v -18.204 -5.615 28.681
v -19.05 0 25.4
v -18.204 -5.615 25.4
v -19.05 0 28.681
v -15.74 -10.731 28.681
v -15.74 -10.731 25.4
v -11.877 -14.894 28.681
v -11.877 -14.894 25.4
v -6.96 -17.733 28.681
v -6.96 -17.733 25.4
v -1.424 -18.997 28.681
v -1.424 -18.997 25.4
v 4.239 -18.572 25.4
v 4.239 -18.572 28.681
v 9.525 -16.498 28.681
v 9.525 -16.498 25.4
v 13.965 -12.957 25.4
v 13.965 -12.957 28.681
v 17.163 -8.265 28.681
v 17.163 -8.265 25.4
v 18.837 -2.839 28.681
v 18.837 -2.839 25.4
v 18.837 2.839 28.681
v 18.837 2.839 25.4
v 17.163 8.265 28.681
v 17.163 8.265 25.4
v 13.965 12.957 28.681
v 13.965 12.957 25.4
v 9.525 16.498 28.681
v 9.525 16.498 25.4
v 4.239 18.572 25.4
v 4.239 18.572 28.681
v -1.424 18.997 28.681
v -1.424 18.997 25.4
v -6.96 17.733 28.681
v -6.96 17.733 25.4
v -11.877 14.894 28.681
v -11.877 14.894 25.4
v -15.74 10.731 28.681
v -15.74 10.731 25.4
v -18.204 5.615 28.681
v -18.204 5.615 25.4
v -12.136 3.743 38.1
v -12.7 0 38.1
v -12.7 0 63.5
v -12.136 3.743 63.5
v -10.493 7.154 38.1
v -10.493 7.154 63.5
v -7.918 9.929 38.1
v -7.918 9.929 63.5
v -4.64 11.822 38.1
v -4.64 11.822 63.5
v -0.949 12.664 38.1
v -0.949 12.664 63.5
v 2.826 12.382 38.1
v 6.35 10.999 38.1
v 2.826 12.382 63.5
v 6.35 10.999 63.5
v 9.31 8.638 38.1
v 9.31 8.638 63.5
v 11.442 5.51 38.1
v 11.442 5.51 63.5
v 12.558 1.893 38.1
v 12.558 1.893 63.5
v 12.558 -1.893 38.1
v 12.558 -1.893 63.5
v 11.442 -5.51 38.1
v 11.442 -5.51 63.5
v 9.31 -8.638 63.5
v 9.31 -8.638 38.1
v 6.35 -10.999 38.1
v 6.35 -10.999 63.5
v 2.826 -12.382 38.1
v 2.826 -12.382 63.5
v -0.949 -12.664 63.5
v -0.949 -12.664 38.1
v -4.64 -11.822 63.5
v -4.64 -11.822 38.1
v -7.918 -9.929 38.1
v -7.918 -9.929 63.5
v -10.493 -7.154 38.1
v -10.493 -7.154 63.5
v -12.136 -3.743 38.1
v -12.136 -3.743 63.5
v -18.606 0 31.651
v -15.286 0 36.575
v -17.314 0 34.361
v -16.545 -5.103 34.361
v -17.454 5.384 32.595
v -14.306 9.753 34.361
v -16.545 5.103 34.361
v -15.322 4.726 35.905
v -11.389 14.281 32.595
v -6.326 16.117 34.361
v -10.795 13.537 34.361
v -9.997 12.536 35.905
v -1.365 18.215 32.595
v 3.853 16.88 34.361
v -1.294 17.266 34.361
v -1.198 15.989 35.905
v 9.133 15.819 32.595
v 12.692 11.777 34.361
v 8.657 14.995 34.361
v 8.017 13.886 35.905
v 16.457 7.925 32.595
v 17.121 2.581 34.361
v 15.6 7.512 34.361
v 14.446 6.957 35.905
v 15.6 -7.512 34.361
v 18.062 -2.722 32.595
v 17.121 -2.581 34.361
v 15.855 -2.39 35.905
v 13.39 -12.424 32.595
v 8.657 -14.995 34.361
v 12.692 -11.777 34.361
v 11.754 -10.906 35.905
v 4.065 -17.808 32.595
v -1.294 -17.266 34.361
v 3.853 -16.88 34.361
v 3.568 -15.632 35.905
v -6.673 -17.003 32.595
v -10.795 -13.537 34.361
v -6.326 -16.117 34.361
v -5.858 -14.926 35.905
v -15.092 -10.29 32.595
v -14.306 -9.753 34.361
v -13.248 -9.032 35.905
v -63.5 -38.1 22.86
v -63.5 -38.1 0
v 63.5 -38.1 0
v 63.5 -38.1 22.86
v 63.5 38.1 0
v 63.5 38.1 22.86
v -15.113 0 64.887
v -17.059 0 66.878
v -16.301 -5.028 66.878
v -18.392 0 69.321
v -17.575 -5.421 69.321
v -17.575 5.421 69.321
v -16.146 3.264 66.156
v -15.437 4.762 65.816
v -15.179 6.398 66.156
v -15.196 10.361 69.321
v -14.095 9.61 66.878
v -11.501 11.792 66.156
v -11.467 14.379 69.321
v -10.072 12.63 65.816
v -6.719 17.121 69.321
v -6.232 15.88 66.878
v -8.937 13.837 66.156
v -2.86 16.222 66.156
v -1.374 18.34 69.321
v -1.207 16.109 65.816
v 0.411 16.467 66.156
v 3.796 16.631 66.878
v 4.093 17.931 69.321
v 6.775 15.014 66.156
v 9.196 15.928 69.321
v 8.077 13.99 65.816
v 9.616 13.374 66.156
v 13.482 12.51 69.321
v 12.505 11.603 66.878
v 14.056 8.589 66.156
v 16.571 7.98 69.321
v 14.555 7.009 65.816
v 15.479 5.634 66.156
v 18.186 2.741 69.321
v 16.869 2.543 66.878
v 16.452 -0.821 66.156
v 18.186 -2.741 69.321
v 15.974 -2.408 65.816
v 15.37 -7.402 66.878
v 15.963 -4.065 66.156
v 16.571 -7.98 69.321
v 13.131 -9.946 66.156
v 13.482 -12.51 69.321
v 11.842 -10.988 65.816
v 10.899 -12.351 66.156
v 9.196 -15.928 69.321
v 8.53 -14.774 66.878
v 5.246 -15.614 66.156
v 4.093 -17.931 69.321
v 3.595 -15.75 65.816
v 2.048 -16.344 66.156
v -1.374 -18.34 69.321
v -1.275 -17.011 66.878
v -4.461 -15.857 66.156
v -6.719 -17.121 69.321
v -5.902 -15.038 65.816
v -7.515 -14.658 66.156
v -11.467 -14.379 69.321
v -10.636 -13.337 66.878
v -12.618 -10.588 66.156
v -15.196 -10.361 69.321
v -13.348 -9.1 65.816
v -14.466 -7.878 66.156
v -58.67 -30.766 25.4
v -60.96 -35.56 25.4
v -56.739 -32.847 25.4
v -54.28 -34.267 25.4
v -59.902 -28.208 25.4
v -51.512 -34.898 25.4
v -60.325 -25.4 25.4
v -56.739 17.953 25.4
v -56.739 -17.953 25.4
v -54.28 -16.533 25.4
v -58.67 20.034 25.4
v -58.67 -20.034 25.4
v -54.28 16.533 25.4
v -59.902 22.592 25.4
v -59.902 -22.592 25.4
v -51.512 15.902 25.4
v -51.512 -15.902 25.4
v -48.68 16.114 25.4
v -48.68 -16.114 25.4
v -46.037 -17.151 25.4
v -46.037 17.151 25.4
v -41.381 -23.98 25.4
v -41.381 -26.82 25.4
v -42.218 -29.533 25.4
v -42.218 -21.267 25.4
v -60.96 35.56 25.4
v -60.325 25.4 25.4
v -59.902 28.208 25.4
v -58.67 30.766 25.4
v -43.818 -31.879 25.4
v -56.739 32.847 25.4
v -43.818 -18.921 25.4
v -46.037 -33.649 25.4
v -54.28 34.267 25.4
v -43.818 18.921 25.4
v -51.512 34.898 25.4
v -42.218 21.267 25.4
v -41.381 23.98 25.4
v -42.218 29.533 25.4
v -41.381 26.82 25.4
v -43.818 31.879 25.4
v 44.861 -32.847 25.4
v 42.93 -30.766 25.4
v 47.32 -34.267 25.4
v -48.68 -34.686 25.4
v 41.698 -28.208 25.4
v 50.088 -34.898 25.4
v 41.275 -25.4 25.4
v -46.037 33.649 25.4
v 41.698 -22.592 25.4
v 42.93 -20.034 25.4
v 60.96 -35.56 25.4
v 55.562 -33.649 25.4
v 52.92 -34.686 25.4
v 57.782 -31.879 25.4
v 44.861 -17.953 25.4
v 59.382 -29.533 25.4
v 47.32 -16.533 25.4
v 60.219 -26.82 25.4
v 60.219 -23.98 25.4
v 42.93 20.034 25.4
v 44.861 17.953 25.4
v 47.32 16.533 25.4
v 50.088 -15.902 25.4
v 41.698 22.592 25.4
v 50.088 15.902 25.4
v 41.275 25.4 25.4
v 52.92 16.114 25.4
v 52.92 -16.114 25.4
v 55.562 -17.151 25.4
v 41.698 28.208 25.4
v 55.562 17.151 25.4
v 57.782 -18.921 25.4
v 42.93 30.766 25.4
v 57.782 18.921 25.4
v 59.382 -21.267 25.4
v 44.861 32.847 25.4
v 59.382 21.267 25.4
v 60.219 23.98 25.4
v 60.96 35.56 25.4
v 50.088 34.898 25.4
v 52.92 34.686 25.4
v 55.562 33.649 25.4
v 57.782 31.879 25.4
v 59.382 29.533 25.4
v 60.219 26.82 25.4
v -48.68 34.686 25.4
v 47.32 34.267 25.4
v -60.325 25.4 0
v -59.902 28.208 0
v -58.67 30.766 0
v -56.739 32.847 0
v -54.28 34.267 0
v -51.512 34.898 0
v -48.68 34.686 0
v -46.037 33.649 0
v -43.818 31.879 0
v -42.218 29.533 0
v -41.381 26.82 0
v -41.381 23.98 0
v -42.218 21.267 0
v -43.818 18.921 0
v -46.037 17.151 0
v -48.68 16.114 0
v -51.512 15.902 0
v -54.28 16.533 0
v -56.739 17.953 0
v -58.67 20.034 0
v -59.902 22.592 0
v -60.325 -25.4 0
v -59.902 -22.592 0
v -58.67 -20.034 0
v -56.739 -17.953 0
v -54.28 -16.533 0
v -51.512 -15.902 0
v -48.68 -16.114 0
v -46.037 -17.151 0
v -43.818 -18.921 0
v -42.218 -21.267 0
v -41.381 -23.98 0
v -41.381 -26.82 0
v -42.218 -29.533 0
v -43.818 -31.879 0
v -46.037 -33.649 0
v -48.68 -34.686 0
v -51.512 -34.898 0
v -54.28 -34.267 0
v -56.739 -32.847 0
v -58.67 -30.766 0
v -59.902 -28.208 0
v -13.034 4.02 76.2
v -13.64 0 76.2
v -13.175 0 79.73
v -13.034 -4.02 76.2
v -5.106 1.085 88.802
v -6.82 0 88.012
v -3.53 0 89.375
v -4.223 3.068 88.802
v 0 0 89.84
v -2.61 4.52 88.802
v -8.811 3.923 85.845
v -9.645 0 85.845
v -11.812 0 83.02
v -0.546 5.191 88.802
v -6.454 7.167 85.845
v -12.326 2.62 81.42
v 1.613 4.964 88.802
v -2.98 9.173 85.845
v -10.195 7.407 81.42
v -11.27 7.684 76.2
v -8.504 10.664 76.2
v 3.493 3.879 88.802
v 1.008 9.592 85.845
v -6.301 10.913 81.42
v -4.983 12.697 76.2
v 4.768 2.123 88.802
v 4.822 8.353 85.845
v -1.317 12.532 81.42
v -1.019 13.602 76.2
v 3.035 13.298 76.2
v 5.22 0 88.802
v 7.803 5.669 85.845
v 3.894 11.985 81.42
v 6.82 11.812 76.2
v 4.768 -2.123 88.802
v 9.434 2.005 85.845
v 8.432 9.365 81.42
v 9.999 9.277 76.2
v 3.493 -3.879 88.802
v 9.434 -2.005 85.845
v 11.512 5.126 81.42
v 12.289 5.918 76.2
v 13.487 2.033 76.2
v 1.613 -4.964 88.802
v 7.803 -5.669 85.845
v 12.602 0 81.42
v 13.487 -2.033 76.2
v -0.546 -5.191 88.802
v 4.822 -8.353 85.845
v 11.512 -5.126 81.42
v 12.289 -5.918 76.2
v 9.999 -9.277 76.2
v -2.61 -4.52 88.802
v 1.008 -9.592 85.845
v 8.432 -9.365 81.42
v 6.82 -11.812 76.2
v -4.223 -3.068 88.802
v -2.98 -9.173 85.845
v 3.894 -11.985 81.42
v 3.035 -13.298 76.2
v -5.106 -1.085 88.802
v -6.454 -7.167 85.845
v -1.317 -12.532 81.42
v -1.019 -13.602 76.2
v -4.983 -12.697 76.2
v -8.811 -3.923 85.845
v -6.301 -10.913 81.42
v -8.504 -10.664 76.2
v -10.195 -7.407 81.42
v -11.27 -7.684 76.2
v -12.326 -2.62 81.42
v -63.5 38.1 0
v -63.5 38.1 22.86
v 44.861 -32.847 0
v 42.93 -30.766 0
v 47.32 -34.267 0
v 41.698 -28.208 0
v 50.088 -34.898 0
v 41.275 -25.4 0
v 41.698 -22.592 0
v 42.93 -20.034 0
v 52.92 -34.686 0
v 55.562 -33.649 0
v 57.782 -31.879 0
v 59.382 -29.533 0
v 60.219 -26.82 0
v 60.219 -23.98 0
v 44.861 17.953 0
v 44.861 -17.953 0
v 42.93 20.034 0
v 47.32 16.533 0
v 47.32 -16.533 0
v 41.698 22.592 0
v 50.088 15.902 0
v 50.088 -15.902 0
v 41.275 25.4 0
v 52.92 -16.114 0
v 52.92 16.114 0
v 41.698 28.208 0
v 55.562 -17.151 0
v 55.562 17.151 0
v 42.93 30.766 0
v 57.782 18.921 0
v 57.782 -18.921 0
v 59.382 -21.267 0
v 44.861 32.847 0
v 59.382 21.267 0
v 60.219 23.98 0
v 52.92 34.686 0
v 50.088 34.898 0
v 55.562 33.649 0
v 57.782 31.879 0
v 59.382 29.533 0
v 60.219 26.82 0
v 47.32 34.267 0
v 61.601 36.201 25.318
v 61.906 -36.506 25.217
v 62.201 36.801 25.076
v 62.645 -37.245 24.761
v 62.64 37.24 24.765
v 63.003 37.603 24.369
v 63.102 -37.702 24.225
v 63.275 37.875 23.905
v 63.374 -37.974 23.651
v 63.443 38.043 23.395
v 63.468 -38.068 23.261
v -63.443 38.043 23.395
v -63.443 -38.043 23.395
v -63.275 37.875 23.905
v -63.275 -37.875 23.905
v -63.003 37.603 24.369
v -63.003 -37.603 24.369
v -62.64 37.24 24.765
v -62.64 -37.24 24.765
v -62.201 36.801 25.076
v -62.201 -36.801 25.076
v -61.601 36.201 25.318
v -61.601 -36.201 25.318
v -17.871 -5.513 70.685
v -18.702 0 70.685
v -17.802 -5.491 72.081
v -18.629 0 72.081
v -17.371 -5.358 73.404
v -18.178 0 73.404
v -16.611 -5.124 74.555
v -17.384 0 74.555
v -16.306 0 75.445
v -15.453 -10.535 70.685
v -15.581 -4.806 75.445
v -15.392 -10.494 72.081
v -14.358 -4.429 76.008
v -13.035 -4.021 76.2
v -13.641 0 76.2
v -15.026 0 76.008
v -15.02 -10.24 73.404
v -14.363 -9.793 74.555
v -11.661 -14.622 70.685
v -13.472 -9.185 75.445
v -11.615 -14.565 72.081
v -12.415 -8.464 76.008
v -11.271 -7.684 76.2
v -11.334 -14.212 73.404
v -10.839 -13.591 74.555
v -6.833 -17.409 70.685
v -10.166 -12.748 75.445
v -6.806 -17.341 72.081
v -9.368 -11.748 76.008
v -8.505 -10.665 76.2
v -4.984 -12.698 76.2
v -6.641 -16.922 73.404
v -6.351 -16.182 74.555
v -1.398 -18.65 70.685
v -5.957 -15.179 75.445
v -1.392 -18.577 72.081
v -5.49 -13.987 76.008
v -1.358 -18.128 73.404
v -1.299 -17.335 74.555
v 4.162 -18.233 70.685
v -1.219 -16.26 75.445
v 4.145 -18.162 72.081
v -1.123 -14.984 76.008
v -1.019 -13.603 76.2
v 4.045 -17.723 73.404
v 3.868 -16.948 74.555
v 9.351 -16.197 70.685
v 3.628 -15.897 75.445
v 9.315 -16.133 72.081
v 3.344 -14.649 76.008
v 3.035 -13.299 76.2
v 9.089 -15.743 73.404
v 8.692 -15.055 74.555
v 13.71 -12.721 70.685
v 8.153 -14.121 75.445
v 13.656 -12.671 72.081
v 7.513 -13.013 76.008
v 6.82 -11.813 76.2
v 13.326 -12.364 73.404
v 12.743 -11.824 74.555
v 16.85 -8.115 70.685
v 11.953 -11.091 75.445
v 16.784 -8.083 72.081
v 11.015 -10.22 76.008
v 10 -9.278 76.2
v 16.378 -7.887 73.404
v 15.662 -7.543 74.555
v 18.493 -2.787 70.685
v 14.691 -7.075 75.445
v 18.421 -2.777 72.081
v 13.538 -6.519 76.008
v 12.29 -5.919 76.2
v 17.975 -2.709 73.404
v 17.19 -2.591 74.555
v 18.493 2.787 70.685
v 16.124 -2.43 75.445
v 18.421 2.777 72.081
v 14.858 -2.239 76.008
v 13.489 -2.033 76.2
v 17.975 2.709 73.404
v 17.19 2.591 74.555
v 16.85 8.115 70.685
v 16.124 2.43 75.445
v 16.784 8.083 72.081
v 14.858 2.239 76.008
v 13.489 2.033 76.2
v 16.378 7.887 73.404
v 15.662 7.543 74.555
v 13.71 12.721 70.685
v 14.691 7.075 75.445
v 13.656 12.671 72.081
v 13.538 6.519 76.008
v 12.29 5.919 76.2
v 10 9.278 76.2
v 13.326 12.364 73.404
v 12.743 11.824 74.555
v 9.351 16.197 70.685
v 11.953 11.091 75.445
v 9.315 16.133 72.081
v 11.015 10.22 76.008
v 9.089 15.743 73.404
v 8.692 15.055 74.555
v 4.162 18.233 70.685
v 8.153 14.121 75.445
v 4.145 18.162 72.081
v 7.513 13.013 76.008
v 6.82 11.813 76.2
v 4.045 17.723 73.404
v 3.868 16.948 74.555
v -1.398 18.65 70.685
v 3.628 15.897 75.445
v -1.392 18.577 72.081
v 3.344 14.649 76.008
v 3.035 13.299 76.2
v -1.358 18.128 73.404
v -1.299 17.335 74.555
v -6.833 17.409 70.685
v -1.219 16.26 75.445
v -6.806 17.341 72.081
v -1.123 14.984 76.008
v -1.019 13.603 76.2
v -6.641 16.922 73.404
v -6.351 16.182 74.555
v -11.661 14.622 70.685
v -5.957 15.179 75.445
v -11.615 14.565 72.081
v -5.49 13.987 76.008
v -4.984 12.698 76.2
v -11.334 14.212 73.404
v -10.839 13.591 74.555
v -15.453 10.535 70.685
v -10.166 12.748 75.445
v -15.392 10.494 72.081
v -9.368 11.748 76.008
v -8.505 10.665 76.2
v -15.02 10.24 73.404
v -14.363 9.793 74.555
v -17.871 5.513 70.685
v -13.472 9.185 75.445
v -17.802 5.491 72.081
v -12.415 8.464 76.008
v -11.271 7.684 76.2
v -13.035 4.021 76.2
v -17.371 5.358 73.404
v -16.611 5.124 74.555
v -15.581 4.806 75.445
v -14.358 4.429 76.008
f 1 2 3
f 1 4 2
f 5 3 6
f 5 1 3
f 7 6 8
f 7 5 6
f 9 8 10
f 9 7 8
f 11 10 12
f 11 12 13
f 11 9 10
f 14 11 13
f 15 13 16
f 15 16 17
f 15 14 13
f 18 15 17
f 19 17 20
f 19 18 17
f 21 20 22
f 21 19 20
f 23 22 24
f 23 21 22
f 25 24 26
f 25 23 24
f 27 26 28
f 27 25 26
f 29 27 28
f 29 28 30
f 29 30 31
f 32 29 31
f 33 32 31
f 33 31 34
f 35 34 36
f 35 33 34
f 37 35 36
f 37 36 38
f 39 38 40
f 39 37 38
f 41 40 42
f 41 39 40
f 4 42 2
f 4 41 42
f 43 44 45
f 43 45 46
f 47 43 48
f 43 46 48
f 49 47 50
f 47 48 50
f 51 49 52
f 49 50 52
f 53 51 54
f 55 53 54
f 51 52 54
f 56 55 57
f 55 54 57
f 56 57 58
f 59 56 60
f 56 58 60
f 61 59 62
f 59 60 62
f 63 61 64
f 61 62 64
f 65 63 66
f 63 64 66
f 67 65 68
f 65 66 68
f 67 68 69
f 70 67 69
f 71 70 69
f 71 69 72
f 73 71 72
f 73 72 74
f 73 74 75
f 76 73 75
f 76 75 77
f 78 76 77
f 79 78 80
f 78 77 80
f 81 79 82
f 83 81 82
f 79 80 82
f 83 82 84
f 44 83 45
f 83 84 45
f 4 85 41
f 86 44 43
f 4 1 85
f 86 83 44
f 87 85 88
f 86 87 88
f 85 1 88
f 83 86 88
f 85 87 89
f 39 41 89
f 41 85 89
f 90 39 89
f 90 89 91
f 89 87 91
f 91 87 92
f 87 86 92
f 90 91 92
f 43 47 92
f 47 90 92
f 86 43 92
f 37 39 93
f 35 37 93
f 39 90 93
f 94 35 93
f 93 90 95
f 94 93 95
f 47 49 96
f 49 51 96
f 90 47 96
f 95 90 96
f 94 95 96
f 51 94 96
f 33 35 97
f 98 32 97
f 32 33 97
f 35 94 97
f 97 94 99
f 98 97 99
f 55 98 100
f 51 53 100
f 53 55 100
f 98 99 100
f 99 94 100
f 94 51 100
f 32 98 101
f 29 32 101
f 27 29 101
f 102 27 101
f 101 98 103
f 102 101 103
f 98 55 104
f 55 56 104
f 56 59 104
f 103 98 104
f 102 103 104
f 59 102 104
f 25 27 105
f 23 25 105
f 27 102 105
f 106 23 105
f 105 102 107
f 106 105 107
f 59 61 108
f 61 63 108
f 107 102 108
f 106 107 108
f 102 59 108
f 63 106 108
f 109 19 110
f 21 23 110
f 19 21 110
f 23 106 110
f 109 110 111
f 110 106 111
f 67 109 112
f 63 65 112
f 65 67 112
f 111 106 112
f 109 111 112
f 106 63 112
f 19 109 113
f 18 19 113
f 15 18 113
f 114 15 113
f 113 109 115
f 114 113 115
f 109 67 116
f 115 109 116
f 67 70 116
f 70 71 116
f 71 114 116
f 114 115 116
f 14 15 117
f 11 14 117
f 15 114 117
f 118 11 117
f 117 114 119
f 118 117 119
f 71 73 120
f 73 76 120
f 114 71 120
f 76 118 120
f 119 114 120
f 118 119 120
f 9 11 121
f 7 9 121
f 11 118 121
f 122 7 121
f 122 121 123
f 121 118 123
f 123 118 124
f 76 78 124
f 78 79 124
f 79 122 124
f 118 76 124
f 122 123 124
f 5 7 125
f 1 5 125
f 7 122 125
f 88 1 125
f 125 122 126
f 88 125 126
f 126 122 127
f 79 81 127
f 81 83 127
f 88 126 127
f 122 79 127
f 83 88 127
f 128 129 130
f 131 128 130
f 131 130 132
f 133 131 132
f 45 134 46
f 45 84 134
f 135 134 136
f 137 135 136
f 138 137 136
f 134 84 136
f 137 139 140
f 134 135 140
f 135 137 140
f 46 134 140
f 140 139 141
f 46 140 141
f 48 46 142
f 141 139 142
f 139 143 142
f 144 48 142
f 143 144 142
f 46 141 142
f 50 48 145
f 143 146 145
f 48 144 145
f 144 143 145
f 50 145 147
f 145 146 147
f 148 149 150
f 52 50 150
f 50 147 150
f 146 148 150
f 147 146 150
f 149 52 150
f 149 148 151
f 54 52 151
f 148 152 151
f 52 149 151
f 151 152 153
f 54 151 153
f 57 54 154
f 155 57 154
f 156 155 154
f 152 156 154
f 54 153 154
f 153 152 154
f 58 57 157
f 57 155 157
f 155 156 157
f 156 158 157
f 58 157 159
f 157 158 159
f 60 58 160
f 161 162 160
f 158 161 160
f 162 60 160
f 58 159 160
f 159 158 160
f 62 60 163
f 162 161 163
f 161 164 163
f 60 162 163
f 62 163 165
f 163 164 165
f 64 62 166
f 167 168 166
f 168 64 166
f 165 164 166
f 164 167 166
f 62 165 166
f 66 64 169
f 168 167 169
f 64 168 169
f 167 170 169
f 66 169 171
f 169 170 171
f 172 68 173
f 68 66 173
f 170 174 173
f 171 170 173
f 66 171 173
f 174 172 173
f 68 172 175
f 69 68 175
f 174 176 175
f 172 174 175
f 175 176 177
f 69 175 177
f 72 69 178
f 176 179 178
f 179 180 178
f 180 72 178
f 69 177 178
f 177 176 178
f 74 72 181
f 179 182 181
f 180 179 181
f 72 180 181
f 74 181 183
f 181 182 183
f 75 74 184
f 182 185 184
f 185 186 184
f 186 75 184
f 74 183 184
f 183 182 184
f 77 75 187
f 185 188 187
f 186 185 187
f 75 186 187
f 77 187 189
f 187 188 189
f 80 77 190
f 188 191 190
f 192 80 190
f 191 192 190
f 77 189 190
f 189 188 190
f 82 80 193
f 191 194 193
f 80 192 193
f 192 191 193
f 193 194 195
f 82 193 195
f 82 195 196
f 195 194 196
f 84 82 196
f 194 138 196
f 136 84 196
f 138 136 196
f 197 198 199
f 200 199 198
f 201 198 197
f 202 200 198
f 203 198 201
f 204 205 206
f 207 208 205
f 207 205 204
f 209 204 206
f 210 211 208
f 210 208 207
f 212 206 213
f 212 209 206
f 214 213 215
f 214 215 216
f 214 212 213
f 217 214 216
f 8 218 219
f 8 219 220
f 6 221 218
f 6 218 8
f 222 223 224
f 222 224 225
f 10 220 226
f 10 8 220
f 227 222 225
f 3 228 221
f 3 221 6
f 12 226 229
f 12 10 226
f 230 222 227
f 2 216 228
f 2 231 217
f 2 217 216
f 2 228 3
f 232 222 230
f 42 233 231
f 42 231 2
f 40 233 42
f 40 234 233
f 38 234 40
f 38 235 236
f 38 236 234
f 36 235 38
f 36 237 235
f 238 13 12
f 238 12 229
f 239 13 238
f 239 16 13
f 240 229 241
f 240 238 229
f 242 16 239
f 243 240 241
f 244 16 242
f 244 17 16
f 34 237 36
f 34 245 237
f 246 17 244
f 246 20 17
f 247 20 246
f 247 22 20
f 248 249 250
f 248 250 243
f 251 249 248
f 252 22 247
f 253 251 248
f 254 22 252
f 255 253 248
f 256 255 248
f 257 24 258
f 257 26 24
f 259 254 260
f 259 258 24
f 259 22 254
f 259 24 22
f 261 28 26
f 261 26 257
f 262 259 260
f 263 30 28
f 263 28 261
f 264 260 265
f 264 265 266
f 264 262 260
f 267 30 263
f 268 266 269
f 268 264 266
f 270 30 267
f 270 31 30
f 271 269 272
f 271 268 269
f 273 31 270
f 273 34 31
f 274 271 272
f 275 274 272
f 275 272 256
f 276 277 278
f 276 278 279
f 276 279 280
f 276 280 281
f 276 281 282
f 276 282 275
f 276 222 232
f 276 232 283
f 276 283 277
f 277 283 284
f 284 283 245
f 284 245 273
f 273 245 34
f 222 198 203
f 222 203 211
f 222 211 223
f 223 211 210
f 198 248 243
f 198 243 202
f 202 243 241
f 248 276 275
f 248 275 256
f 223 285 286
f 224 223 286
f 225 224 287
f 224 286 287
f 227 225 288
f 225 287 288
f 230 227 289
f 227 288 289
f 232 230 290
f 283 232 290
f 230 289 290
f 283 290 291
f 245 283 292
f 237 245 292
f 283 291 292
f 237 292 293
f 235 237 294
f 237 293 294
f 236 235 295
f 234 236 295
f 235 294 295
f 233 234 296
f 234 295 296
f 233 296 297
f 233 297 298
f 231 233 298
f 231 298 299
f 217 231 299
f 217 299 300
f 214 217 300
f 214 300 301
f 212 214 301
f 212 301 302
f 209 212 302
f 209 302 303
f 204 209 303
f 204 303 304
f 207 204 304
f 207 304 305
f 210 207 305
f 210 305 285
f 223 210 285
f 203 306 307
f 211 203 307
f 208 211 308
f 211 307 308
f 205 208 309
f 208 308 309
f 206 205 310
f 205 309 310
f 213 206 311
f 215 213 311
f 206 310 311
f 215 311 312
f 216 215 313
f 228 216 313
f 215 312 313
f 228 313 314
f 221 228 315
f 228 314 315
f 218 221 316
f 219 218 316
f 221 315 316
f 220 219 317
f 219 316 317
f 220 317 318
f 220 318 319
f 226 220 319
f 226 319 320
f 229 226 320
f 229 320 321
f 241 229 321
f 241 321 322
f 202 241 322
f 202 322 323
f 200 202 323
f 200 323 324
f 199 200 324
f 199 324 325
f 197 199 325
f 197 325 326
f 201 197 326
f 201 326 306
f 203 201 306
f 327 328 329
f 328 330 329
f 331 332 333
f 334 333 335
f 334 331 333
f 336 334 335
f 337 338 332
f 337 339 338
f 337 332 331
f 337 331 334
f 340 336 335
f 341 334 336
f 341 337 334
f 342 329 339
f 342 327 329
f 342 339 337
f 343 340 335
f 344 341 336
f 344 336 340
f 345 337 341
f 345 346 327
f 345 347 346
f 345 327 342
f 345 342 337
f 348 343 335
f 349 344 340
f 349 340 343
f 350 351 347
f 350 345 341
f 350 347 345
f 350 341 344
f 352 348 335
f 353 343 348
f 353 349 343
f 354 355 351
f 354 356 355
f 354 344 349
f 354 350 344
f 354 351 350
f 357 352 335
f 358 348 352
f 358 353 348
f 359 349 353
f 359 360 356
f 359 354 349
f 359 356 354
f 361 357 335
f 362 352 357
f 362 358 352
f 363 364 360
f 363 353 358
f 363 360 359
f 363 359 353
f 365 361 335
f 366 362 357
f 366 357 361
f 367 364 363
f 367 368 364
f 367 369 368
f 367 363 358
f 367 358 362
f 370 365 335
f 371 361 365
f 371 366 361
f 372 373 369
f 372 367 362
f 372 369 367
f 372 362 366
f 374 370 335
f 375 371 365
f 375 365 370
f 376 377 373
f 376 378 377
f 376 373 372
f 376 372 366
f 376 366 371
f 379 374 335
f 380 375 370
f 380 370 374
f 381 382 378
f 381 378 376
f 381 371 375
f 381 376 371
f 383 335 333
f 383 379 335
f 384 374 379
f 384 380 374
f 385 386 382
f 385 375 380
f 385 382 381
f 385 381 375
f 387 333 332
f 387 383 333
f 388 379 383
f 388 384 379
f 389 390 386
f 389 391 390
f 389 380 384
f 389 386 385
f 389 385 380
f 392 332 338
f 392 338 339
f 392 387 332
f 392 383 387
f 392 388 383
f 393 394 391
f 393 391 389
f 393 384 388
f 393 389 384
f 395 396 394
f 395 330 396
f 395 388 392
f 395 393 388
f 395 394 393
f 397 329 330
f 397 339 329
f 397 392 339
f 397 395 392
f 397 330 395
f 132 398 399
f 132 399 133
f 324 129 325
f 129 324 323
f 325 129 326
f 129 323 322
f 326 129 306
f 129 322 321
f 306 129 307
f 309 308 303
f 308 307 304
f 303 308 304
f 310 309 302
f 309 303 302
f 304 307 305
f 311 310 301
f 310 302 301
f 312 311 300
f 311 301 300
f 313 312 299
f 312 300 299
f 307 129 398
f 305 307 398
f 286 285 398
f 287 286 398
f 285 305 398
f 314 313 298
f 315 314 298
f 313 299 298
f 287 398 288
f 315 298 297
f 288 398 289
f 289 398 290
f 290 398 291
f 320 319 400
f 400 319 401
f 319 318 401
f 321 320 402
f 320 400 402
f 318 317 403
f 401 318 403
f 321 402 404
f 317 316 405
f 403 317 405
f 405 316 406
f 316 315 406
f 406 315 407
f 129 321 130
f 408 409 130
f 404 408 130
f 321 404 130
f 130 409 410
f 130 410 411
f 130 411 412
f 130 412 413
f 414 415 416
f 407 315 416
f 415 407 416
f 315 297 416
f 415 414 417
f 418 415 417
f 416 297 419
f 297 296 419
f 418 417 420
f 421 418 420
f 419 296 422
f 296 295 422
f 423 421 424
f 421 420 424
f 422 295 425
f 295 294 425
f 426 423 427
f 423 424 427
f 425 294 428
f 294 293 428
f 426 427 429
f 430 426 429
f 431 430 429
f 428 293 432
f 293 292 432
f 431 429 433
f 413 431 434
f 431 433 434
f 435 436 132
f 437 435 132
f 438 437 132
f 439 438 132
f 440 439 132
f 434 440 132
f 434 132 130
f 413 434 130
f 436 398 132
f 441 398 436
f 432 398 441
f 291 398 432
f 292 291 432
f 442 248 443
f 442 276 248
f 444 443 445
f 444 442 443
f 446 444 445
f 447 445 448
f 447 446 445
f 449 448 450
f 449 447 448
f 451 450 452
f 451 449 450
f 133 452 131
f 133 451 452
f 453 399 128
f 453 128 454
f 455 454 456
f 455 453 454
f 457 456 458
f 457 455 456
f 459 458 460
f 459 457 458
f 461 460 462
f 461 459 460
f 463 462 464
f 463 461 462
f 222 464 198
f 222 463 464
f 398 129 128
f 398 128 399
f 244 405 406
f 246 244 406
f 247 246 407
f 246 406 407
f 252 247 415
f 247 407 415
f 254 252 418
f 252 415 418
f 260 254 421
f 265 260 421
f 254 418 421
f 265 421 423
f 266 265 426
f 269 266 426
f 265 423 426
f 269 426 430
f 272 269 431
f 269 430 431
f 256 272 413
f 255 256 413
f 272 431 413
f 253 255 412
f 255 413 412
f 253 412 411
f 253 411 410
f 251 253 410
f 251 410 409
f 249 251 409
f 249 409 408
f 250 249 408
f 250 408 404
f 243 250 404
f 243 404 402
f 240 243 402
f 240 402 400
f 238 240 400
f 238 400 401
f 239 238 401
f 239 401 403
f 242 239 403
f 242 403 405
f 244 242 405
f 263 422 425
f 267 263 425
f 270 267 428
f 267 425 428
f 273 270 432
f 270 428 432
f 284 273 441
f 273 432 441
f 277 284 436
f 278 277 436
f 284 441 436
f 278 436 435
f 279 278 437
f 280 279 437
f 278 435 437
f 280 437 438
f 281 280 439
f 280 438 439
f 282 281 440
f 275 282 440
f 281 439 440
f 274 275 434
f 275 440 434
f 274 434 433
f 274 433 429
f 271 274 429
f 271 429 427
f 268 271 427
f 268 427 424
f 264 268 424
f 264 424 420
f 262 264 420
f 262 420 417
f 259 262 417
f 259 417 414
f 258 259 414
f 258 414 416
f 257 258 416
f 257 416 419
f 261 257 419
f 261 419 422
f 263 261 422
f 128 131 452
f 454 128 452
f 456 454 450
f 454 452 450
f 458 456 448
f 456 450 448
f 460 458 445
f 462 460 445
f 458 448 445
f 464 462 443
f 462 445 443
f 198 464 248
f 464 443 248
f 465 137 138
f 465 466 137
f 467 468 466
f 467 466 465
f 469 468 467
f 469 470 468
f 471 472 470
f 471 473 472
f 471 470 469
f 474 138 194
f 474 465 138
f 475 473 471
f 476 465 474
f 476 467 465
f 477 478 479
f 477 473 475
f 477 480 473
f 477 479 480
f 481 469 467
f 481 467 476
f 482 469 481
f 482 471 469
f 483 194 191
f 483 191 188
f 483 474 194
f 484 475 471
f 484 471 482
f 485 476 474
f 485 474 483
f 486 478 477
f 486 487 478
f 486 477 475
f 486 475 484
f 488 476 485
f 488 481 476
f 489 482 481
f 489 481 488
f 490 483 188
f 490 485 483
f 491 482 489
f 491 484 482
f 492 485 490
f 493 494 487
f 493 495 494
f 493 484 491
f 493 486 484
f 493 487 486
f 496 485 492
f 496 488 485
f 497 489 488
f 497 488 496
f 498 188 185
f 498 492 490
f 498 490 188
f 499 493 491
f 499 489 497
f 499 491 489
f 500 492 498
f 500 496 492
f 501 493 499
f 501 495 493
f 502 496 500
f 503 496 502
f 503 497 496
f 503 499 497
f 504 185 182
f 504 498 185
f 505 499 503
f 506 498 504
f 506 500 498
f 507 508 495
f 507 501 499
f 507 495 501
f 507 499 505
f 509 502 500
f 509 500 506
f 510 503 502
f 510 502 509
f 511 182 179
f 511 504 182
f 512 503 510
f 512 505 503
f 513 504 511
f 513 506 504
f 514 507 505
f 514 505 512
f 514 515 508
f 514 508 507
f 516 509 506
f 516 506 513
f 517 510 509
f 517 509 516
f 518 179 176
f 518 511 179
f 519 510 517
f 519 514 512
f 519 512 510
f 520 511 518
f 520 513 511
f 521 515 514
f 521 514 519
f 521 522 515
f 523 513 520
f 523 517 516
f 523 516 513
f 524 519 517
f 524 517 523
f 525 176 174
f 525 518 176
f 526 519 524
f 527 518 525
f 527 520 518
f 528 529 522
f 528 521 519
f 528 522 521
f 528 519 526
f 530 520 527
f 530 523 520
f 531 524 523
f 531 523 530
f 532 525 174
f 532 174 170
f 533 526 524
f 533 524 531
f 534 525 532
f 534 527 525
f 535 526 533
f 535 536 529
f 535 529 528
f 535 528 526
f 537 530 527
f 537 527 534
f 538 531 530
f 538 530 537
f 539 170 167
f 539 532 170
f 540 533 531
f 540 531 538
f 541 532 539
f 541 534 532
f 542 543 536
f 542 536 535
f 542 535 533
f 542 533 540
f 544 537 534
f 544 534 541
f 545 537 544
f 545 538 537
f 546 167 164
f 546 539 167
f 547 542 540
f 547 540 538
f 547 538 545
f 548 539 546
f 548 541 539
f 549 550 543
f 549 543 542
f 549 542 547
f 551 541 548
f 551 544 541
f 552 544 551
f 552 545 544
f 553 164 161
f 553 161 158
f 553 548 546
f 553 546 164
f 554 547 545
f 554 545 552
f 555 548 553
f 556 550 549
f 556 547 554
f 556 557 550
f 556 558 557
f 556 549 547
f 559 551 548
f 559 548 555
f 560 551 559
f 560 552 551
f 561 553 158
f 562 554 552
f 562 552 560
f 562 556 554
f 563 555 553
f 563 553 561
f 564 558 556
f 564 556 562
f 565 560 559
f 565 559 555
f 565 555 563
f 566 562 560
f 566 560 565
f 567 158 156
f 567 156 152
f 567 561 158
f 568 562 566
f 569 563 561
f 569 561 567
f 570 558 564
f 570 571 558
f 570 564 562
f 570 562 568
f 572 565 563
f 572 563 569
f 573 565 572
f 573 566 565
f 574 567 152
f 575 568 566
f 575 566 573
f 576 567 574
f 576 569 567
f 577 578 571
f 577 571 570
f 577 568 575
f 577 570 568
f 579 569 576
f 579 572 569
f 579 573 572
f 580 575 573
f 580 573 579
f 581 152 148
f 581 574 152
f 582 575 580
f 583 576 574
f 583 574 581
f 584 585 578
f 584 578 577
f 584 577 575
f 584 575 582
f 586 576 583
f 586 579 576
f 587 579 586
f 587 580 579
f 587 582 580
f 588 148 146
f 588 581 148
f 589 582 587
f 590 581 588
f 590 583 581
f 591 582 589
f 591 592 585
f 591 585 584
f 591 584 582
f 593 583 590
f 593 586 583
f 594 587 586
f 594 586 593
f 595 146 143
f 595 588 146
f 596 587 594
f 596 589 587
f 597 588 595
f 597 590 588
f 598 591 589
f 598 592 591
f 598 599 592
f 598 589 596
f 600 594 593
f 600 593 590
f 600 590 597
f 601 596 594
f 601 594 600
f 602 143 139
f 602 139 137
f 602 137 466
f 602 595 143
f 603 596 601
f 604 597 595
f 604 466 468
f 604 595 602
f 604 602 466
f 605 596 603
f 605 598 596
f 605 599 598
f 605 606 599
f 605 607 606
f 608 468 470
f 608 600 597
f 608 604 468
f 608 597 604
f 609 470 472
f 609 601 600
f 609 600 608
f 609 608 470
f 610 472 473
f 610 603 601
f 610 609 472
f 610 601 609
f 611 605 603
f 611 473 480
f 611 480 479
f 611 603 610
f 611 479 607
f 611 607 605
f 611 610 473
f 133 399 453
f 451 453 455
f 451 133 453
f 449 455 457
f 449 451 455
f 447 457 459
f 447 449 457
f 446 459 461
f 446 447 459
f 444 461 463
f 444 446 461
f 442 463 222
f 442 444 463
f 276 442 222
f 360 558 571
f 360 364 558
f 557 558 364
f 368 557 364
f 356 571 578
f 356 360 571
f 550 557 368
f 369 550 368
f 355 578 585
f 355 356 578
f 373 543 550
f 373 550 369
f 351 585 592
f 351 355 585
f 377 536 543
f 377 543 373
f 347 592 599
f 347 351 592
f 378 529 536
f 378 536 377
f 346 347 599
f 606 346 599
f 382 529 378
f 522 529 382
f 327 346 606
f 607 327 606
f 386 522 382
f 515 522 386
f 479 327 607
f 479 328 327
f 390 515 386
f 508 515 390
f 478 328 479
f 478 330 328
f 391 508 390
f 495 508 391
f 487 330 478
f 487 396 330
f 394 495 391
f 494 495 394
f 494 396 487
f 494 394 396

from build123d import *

# Parameters (mm, degrees)
F0_W     = 127
F0_H     = 76.2
F1_DEPTH = 25.4
F3_D     = 19.05
F4_W     = 19.05
F4_H     = 50.8
F6_W     = 12.7
F6_H     = 25.4
F9_R     = 2.54


# Not quite as in the source:
# - a fillet or chamfer that OpenCascade refuses, or shapes differently, is made with other operations: its cross-section is extruded or revolved along the edge and cut away or added


with BuildPart() as f1:
    # F0 (on Top) → F1 (new body)
    with BuildSketch(Plane.XY):
        Rectangle(F0_W, F0_H)
    extrude(amount=F1_DEPTH)

    # F3 (through all)
    with Locations(Plane.XY.offset(25.4)):
        with Locations((-50.8, 25.4), (50.8, 25.4), (-50.8, -25.4), (50.8, -25.4)):
            Hole(F3_D / 2)

    # F4 (on Front) → F5 (revolve)
    with BuildSketch(Plane.XZ):
        with Locations((-9.525, 50.8)):
            Rectangle(F4_W, F4_H)
    revolve(axis=Axis((0, 0, 50.8), (0, 0, 1)))

    # F6 (on Front) → F7 (revolve, cut)
    with BuildSketch(Plane.XZ):
        with Locations((-19.05, 50.8)):
            Rectangle(F6_W, F6_H)
    revolve(axis=Axis((0, 0, 50.8), (0, 0, -1)), mode=Mode.SUBTRACT)

    # F8: fillet of radius 10.16 on 2 edges, made by hand

    # F8_s1 → F8_t2 (revolve, cut)
    with BuildSketch(Plane.XZ):
        with BuildLine():
            ThreePointArc((-19.05, 28.6814279214), (-17.3142269675, 34.3610405842), (-12.7, 38.1))
            Line((-12.7, 38.1), (-19.05, 38.1))
            Line((-19.05, 38.1), (-19.05, 28.6814279214))
        make_face()
    revolve(axis=Axis((0, 0, 38.1), (0, 0, -1)), mode=Mode.SUBTRACT)

    # F8_s3 → F8_t4 (revolve, cut)
    with BuildSketch(Plane.XZ):
        with BuildLine():
            ThreePointArc((-12.7, 63.5), (-17.3142269675, 67.2389594158), (-19.05, 72.9185720786))
            Line((-19.05, 72.9185720786), (-19.05, 63.5))
            Line((-19.05, 63.5), (-12.7, 63.5))
        make_face()
    revolve(axis=Axis((0, 0, 63.5), (0, 0, -1)), mode=Mode.SUBTRACT)

    # F9
    f9_edges = [f1.edges().sort_by_distance(p)[0] for p in [
        (0, 38.1, 25.4),
        (63.5, 0, 25.4),
        (0, -38.1, 25.4),
        (-63.5, 0, 25.4),
    ]]
    fillet(f9_edges, radius=F9_R)

    # F10: fillet of radius 5.08 on 1 edges, made by hand

    # F10_s1 → F10_t2 (revolve, cut)
    with BuildSketch(Plane.XZ):
        with BuildLine():
            ThreePointArc((-18.3919026469, 69.3214279214), (-17.8208524084, 74.0070100312), (-13.6409513235, 76.2))
            Line((-13.6409513235, 76.2), (-13.6409513235, 76.708))
            Line((-13.6409513235, 76.708), (-19.05, 76.708))
            Line((-19.05, 76.708), (-19.558, 76.2))
            ThreePointArc((-19.558, 76.2), (-19.558, 72.9185720786), (-18.8669977793, 69.1415707135))
            Line((-18.8669977793, 69.1415707135), (-18.3919026469, 69.3214279214))
        make_face()
    revolve(axis=Axis((0, 0, 76.2), (0, 0, 1)), mode=Mode.SUBTRACT)

    # F11 (on Front) → F12 (revolve)
    with BuildSketch(Plane.XZ):
        with BuildLine():
            Line((0, 76.2), (0, 89.8398))
            ThreePointArc((0, 89.8398), (-9.710461042, 85.7786789481), (-13.638526776, 76.0136363248))
            Line((-13.638526776, 76.0136363248), (0, 76.2))
        make_face()
    revolve(axis=Axis((0, 0, 83.0199), (0, 0, -1)))


solid = f1.part
